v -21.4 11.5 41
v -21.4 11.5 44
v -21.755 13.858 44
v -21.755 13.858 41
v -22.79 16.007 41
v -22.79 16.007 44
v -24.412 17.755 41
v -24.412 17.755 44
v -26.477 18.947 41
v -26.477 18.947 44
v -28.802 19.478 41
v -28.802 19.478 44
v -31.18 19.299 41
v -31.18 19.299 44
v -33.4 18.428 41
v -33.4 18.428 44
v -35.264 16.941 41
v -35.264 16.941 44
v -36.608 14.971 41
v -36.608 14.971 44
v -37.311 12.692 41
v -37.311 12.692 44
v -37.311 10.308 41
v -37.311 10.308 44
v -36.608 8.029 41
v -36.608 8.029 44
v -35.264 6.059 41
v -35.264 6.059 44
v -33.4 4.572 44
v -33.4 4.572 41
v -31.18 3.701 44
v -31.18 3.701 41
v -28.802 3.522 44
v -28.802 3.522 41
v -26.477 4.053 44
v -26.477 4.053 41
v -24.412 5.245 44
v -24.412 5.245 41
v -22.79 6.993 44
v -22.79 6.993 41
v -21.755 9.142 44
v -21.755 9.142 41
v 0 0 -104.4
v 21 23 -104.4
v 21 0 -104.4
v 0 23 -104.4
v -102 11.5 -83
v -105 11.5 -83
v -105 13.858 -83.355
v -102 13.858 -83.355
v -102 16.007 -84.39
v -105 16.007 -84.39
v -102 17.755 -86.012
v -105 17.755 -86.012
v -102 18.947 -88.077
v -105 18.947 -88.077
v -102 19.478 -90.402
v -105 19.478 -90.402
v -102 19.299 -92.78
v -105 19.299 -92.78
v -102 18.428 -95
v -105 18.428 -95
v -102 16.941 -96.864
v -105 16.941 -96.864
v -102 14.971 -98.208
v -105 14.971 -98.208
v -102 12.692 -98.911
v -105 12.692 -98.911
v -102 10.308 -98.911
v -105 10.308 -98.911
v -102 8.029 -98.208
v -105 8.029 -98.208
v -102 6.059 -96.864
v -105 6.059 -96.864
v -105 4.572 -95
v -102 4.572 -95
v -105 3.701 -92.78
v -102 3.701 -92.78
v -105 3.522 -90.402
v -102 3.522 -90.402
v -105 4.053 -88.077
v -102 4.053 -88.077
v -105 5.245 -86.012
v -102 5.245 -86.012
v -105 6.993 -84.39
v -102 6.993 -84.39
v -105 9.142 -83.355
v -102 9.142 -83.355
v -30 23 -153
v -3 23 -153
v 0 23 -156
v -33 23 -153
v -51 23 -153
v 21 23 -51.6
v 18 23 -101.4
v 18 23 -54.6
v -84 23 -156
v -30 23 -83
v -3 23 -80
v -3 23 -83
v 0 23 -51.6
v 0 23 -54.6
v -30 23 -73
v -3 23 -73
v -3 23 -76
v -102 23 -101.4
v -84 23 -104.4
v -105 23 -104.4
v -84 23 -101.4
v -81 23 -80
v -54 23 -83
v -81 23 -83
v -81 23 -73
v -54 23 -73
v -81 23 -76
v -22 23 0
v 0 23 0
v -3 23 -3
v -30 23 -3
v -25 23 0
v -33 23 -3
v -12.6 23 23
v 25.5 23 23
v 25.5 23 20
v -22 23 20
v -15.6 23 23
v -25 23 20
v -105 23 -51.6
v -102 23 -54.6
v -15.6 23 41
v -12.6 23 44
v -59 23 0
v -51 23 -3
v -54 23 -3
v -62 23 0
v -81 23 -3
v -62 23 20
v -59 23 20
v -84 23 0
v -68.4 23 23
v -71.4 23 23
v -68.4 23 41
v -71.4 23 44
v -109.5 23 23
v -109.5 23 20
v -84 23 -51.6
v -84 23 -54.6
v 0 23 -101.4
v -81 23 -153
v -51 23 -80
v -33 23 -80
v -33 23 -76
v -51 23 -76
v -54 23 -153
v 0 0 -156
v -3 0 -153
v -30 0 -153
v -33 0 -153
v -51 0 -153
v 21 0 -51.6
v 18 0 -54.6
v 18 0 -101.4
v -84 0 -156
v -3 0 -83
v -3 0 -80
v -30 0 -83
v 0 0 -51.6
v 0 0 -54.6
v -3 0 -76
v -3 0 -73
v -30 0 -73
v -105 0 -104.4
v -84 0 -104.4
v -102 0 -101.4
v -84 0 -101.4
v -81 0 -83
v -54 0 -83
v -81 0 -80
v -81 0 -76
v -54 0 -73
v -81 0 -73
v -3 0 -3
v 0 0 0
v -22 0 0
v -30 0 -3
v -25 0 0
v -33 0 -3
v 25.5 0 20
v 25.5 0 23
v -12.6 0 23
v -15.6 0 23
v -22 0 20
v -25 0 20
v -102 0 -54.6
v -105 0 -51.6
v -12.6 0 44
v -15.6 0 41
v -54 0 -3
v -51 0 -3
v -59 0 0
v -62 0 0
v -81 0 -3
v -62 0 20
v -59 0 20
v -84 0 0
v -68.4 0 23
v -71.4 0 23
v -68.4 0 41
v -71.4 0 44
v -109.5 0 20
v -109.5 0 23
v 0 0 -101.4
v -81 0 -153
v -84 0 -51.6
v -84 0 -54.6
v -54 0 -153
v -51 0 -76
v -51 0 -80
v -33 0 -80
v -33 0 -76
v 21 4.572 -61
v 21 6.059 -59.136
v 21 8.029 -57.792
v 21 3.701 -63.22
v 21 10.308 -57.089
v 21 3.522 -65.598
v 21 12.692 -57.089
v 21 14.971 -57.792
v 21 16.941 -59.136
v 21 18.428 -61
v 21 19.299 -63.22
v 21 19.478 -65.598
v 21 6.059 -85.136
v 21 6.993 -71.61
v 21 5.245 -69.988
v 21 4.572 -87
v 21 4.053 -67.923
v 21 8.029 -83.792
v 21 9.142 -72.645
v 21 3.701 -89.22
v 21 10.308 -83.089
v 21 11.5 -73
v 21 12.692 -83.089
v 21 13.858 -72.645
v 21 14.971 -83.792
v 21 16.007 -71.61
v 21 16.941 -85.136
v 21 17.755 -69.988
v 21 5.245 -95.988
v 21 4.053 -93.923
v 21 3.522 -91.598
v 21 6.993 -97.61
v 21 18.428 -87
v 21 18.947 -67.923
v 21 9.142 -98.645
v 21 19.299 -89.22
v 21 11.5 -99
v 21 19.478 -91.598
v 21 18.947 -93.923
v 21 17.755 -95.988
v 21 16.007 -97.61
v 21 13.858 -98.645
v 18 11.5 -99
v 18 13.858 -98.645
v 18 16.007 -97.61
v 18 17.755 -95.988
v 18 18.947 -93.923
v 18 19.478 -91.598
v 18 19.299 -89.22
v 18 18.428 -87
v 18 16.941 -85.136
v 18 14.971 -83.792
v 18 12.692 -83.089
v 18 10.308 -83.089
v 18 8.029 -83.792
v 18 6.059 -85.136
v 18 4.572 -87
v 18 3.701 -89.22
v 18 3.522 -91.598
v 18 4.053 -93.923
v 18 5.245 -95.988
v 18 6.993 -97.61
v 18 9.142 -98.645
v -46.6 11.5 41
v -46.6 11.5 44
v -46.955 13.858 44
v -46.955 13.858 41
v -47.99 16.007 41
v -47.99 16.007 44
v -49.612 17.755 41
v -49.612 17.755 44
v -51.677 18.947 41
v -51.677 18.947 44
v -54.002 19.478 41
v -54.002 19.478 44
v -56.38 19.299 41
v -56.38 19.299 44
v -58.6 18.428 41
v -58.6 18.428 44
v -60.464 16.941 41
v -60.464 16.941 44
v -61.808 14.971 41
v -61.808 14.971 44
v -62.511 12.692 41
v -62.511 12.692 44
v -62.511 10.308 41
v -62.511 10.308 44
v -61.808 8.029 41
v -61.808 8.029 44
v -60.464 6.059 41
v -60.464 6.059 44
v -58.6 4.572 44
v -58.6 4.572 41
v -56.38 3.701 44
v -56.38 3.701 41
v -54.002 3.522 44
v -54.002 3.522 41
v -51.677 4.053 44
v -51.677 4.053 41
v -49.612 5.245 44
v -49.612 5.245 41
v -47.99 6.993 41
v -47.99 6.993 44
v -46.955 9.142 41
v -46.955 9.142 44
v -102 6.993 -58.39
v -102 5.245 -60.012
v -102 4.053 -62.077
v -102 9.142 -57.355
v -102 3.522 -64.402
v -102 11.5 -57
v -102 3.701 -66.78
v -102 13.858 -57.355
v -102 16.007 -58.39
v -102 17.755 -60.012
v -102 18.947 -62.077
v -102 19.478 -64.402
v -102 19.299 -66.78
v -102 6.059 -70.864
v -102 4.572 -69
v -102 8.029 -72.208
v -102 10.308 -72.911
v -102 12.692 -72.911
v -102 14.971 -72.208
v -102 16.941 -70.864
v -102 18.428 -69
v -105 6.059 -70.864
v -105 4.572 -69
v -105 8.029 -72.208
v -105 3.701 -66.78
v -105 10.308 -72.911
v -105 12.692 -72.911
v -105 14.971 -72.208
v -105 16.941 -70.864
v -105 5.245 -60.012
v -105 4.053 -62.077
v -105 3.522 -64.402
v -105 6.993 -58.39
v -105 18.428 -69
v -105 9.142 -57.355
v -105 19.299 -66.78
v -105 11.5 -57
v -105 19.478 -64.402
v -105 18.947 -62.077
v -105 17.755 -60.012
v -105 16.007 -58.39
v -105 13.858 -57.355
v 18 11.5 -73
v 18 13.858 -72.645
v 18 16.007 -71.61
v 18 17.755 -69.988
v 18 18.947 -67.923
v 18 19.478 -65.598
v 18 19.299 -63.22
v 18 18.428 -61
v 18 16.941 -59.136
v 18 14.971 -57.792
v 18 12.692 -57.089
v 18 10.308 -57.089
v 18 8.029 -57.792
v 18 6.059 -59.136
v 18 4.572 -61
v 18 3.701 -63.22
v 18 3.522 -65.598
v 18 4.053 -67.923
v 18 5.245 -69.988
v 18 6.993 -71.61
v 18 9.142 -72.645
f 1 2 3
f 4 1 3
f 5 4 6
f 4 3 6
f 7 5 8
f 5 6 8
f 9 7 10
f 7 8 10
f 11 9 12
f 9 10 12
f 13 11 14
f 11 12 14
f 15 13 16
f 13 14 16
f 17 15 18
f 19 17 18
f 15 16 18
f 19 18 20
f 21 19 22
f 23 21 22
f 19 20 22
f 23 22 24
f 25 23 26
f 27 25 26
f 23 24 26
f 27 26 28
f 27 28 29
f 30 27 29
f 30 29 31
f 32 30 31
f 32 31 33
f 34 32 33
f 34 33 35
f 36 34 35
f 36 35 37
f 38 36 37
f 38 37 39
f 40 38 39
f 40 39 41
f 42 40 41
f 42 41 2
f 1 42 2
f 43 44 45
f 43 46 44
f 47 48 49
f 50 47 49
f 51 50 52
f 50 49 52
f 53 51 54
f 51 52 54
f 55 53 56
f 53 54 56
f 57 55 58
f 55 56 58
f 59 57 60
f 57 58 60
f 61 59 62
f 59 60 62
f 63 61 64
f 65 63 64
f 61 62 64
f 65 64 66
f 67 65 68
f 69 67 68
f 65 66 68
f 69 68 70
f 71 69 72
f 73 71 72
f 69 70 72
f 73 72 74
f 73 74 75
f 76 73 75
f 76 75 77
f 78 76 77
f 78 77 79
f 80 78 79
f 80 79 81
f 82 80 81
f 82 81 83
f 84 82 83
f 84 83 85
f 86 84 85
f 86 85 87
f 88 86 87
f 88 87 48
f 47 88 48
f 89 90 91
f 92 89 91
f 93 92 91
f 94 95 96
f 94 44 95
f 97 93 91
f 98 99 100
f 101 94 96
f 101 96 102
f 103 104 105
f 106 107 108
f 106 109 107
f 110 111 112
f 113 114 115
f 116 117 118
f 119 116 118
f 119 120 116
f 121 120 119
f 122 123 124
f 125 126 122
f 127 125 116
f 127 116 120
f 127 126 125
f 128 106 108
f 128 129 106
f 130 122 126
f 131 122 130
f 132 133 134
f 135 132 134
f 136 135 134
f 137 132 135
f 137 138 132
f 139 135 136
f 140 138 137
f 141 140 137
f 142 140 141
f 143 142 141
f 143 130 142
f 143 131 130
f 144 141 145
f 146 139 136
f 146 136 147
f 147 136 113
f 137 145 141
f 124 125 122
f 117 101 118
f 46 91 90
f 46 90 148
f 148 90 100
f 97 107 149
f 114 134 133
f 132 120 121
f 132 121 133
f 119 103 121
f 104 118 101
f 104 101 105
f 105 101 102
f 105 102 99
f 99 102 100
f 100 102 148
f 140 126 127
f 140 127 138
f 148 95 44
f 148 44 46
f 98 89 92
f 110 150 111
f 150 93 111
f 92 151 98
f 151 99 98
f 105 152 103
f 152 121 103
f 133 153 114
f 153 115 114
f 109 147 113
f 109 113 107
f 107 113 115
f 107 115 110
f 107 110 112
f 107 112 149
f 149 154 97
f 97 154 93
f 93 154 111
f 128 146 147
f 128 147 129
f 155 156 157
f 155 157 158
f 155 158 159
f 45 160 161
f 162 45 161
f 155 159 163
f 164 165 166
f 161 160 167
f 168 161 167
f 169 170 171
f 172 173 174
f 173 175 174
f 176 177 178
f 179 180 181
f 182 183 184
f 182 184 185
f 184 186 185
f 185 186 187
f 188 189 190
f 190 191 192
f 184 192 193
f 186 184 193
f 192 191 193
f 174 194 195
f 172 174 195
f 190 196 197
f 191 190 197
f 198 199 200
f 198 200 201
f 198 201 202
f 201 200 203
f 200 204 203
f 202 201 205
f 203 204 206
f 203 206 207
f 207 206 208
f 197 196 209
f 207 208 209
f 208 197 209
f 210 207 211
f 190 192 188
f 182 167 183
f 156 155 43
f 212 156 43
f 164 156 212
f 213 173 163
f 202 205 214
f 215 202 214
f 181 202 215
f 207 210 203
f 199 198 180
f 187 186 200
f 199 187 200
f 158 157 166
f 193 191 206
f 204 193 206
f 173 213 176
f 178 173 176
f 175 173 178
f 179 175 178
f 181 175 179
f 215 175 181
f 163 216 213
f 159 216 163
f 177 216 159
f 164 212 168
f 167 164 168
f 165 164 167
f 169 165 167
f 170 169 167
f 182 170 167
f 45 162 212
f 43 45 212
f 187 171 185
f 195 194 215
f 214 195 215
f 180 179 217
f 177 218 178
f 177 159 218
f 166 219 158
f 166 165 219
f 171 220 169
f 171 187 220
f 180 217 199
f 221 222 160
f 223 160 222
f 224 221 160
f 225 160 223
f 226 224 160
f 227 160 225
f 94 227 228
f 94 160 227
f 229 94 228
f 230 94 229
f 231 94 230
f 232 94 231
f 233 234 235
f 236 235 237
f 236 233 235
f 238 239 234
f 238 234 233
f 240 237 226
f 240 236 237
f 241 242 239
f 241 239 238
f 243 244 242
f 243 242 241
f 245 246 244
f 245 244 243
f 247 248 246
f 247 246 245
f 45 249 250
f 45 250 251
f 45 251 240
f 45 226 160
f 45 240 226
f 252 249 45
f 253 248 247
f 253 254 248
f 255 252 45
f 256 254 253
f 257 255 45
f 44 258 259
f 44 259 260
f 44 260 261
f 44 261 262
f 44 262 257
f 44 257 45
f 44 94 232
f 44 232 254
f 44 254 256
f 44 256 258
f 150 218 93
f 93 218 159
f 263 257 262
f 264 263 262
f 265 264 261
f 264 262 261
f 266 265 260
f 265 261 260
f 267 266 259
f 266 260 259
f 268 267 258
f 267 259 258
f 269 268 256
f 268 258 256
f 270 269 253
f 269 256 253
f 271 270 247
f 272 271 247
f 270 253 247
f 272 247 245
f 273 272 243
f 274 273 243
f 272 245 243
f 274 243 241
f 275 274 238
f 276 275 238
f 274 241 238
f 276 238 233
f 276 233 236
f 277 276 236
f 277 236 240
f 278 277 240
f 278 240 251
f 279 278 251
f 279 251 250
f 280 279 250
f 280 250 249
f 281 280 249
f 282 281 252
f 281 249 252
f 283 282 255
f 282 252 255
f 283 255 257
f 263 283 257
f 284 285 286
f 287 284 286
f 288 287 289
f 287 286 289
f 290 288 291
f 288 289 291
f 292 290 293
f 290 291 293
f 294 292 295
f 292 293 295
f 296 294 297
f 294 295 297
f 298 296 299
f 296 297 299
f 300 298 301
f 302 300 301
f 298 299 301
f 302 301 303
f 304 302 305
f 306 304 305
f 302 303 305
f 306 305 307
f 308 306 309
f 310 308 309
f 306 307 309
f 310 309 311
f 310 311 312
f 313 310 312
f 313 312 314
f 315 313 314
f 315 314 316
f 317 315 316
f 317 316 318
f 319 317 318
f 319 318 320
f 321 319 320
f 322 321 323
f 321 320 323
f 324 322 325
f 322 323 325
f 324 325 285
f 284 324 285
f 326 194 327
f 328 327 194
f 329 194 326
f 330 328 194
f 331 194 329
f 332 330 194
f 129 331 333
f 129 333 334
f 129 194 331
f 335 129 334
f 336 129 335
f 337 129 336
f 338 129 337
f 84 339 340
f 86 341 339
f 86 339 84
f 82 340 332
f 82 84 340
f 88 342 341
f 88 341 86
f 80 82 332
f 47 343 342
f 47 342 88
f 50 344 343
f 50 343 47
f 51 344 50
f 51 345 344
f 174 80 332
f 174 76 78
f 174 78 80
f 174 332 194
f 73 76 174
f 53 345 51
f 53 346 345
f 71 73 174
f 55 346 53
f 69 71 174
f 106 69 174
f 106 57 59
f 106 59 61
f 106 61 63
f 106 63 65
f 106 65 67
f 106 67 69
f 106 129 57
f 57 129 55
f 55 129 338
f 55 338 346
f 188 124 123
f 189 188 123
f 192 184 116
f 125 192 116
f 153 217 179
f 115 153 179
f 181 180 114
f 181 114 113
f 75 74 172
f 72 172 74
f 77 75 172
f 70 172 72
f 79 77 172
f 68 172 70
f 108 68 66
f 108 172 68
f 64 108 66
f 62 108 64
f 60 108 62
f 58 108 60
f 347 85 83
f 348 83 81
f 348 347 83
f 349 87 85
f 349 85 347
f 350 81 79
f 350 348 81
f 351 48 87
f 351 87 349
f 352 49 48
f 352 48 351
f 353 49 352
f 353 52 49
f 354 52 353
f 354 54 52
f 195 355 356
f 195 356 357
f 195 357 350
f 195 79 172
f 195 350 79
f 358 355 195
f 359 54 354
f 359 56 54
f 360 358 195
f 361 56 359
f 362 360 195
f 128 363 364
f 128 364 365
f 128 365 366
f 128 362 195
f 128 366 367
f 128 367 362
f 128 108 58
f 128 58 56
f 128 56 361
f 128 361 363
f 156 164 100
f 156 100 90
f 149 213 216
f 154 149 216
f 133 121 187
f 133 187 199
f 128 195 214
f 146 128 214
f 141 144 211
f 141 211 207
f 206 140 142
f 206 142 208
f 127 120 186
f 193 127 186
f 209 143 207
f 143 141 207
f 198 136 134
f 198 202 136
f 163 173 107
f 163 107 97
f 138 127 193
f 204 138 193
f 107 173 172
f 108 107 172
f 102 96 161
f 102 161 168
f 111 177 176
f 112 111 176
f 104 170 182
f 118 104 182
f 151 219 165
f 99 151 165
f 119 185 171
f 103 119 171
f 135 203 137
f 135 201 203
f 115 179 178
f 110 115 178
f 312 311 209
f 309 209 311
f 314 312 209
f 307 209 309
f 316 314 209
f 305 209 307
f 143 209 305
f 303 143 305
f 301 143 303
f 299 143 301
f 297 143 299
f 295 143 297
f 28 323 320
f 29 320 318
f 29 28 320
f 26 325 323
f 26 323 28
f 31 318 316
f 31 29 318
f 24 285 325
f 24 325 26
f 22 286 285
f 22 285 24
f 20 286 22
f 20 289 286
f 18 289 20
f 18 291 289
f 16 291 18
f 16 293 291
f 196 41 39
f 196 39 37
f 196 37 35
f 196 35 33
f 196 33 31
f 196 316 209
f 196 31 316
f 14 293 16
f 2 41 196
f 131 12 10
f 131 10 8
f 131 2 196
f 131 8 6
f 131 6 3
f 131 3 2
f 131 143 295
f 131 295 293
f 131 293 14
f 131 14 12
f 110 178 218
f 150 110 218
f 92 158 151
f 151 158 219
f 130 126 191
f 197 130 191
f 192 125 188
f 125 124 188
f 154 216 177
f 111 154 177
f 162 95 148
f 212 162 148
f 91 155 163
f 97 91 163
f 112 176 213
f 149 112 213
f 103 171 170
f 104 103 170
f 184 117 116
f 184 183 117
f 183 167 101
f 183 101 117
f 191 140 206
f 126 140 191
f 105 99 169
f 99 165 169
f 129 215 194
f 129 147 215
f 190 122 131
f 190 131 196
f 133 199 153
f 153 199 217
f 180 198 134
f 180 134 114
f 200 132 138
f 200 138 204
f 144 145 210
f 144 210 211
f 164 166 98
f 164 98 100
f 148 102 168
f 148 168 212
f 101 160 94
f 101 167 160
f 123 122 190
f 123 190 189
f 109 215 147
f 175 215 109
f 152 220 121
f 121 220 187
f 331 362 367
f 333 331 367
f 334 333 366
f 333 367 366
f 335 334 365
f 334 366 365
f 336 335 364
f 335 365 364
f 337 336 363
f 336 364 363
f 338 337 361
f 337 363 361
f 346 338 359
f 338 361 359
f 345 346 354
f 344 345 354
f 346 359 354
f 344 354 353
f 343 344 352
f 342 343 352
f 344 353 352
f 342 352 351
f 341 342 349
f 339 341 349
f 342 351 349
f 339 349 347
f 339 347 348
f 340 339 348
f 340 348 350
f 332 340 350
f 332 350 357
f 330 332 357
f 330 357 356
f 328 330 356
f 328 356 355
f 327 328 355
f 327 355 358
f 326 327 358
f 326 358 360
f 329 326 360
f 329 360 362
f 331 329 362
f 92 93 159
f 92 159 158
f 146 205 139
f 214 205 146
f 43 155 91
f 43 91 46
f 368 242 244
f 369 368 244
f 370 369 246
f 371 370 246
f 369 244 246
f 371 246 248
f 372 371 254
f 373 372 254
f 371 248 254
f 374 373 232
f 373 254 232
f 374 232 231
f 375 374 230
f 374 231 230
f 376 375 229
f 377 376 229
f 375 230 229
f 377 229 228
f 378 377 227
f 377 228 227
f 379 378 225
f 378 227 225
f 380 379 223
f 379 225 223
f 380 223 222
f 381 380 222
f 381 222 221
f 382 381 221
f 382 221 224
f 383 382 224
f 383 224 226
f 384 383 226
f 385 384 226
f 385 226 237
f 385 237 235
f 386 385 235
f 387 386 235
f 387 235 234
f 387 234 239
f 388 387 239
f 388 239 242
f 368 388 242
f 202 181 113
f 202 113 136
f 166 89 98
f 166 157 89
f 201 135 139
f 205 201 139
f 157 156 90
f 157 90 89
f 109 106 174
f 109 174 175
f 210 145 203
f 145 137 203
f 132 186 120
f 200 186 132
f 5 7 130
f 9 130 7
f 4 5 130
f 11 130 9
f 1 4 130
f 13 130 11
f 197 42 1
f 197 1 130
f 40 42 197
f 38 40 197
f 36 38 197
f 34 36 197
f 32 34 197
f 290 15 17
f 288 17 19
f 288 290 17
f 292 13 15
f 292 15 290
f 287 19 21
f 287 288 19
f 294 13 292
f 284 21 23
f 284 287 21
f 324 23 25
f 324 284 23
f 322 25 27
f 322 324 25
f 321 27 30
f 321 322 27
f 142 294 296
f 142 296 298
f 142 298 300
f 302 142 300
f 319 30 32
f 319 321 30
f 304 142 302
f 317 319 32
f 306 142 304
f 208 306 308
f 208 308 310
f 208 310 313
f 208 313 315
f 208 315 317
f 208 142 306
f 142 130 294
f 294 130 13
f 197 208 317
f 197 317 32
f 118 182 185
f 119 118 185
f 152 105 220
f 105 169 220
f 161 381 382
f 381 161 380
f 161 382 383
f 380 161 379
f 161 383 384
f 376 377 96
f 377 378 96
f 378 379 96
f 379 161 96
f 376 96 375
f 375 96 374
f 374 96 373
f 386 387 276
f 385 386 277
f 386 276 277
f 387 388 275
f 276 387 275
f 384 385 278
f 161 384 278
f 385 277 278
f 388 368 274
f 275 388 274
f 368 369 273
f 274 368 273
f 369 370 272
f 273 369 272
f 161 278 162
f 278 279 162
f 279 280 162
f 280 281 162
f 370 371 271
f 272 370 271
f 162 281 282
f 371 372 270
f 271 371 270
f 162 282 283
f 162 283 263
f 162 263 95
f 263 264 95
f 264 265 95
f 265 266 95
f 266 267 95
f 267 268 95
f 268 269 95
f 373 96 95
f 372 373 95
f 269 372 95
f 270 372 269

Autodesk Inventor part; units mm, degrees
ref_plane "YZ Plane" through (0, 0, 0) normal (1, 0, 0) x (0, 1, 0)
ref_plane "XZ Plane" through (0, 0, 0) normal (0, 1, 0) x (-1, 0, 0)
ref_plane "XY Plane" through (0, 0, 0) normal (0, 0, 1) x (1, 0, 0)
sketch "Sketch1" plane through (0, 0, 0) normal (0, 1, 0) x (-1, 0, 0)
  line L0 (0, 0) -> (84, 0)
  line L1 (84, 0) -> (84, -156)
  line L2 (0, -156) -> (0, 0)
  line L3 (0, 0) -> (3, 0) construction
  line L4 (3, 0) -> (3, -3) construction
  line L5 (3, -3) -> (0, -3) construction
  line L6 (0, -3) -> (0, 0) construction
  line L7 (84, -153) -> (84, -156) construction
  line L8 (3, -3) -> (30, -3)
  line L9 (30, -3) -> (30, -73)
  line L10 (30, -73) -> (3, -73)
  line L11 (3, -73) -> (3, -3)
  line L12 (78, -153) -> (54, -153)
  line L13 (54, -153) -> (54, -83)
  line L14 (54, -83) -> (81, -83)
  line L15 (81, -83) -> (81, -153)
  line L16 (0, -153) -> (0, -156) construction
  line L17 (84, 0) -> (81, 0) construction
  line L18 (81, 0) -> (81, -3) construction
  line L19 (81, -3) -> (84, -3) construction
  line L20 (84, -3) -> (84, 0) construction
  line L21 (81, -3) -> (54, -3)
  line L22 (54, -3) -> (54, -73)
  line L23 (54, -73) -> (81, -73)
  line L24 (81, -73) -> (81, -3)
  line L25 (6, -153) -> (30, -153)
  line L26 (30, -153) -> (30, -83)
  line L27 (30, -83) -> (3, -83)
  line L28 (3, -83) -> (3, -153)
  line L29 (30, -3) -> (33, -3) construction
  line L30 (54, -153) -> (51, -153) construction
  line L31 (33, -3) -> (51, -3)
  line L32 (51, -153) -> (33, -153)
  line L33 (3, -73) -> (3, -76) construction
  line L34 (81, -83) -> (81, -80) construction
  line L35 (81, -76) -> (81, -80)
  line L36 (3, -80) -> (3, -76)
  line L37 (33, -153) -> (33, -80)
  line L38 (33, -76) -> (33, -3)
  line L39 (3, -76) -> (33, -76)
  line L40 (51, -76) -> (81, -76)
  line L41 (81, -80) -> (51, -80)
  line L42 (33, -80) -> (3, -80)
  line L43 (51, -3) -> (51, -76)
  line L44 (51, -80) -> (51, -153)
  line L45 (6, -153) -> (78, -153)
  line L46 (3, -153) -> (6, -153)
  line L47 (6, -156) -> (3, -156)
  line L48 (81, -153) -> (78, -153)
  line L49 (78, -156) -> (81, -156)
  line L50 (6, -156) -> (78, -156)
  line L51 (81, -156) -> (84, -156)
  line L52 (3, -156) -> (0, -156)
  dimension "d1" = 156
  dimension "d12" = 3
  dimension "d13" = 3
  dimension "d15" = 70
  dimension "d17" = 70
  dimension "d66" = 3
  dimension "d68" = 3
extrude "Extrusion1" add sketch "Sketch1" along normal blind 23
sketch "Sketch5" plane through (0, 0, 0) normal (1, 0, 0) x (0, 0, -1)
  circle A0 centre (16.6, 11.5) radius 3.5 projected
  circle A1 centre (139.4, 11.5) radius 3.5 projected
  line L0 (153, 23) -> (83, 23) projected
  line L1 (156, 0) -> (0, 0) projected
  line L2 (16.6, 11.5) -> (51.6, 11.5)
  line L3 (139.4, 11.5) -> (104.4, 11.5)
  line L4 (51.6, 23) -> (104.4, 23)
  line L5 (104.4, 23) -> (104.4, 0)
  line L6 (104.4, 0) -> (51.6, 0)
  line L7 (51.6, 0) -> (51.6, 23)
  point P0 (162, 0)
  dimension "d97" = 35
  dimension "d98" = 35
extrude "Extrusion6" add sketch "Sketch5" along normal blind 21 contours L7 L4 L0 L5 L1
sketch "Sketch6" plane through (0, 23, 0) normal (0, 1, 0) x (1, 0, 0)
  line L0 (0, 51.6) -> (21, 51.6) projected
  line L1 (21, 51.6) -> (18, 51.6)
  line L2 (18, 51.6) -> (18, 54.6)
  line L3 (18, 54.6) -> (21, 54.6)
  line L4 (21, 54.6) -> (21, 51.6)
  line L5 (0, 104.4) -> (21, 104.4) projected
  line L6 (21, 104.4) -> (18, 104.4)
  line L7 (18, 104.4) -> (18, 101.4)
  line L8 (18, 101.4) -> (21, 101.4)
  line L9 (21, 101.4) -> (21, 104.4)
  line L10 (18, 54.6) -> (0, 54.6)
  line L11 (18, 54.6) -> (18, 101.4)
  line L12 (18, 101.4) -> (0, 101.4)
  line L13 (0, 54.6) -> (0, 101.4)
  line L14 (-84, 156) -> (-84, 0) projected
  line L15 (-84, 54.6) -> (-102, 54.6)
  line L16 (-84, 54.6) -> (-66, 54.6) construction
  line L17 (-102, 54.6) -> (-102, 101.4)
  line L18 (-102, 101.4) -> (-84, 101.4)
  line L19 (-84, 101.4) -> (-84, 104.4)
  line L20 (-84, 104.4) -> (-105, 104.4)
  line L21 (-105, 104.4) -> (-105, 51.6)
  line L22 (-105, 51.6) -> (-84, 51.6)
  line L23 (-84, 51.6) -> (-84, 54.6)
  point P0 (0, 0)
  point P1 (21, 49.6)
  point P2 (21, 106.4)
  dimension "d99" = 3
  dimension "d100" = 3
  dimension "d101" = 3
  dimension "d102" = 3
  dimension "d112" = 18
  dimension "d113" = 180
  dimension "d114" = 3
  dimension "d115" = 21
extrude "Extrusion7" cut sketch "Sketch6" against normal up to surface (23 mm away) contours L10 L13 L12 L11
extrude "Extrusion10" add sketch "Sketch6" against normal up to surface (23 mm away) contours L14 L18 L17 L15 L22 L21 L20
sketch "Sketch7" plane through (21, 0, 0) normal (1, 0, 0) x (0, 0, -1)
  line L0 (51.6, 0) -> (104.4, 0) projected
  circle A0 centre (91, 11.5) radius 8
  circle A1 centre (65, 11.5) radius 8
  line L1 (104.4, 23) -> (104.4, 0) projected
  line L2 (104.4, 23) -> (91, 23)
  line L3 (91, 23) -> (91, 11.5)
  line L4 (91, 11.5) -> (104.4, 11.5)
  line L5 (104.4, 11.5) -> (104.4, 23)
  circle A2 centre (91, 11.5) radius 8
  circle A3 centre (65, 11.5) radius 8
  point P0 (0, 0)
  dimension "d108" = 16
  dimension "d109" = 16
  dimension "d118" = 13.4
  dimension "d119" = 11.5
extrude "Extrusion9" cut sketch "Sketch7" against normal up to surface (3 mm away) contours L4 L3 A0 | A0 L3 L4 | A1
sketch "Sketch9" plane through (-105, 23, -104.4) normal (-1, 0, 0) x (0, 0, 1)
  line L0 (0, 0) -> (0, -23) projected
  line L1 (0, 0) -> (13.4, 0)
  line L2 (13.4, 0) -> (13.4, -11.5)
  line L3 (13.4, -11.5) -> (0, -11.5)
  line L4 (0, -11.5) -> (0, 0)
  circle A0 centre (13.4, -11.5) radius 8
  line L5 (0, 0) -> (52.8, 0) projected
  line L6 (52.8, 0) -> (39.4, 0)
  line L7 (39.4, 0) -> (39.4, -11.5)
  line L8 (39.4, -11.5) -> (52.8, -11.5)
  line L9 (52.8, -11.5) -> (52.8, 0)
  circle A1 centre (39.4, -11.5) radius 8
  point P0 (104.4, -23)
  dimension "d120" = 13.4
  dimension "d121" = 11.5
  dimension "d122" = 16
  dimension "d123" = 13.4
  dimension "d124" = 11.5
  dimension "d125" = 16
extrude "Extrusion11" cut sketch "Sketch9" against normal blind 10 contours A0 L2 L3 | L3 L2 A0 | A1 L8 L7 | L7 L8 A1
sketch "Sketch10" plane through (-84, 0, 0) normal (0, 0, 1) x (1, 0, 0)
  line L0 (25, 23) -> (25, 0)
  line L1 (0, 0) -> (84, 0) projected
  line L2 (25, 0) -> (22, 0)
  line L3 (22, 0) -> (22, 23)
  line L4 (22, 23) -> (25, 23)
  line L5 (59, 23) -> (59, 0)
  line L6 (81, 0) -> (54, 0) projected
  line L7 (59, 0) -> (62, 0)
  line L8 (62, 0) -> (62, 23)
  line L9 (62, 23) -> (59, 23)
  point P0 (0, 23)
  point P1 (84, 23)
  dimension "d128" = 25
  dimension "d129" = 3
  dimension "d130" = 25
  dimension "d131" = 3
extrude "Extrusion12" add sketch "Sketch10" along normal blind 23
sketch "Sketch11" plane through (-62, 0, 0) normal (-1, 0, 0) x (0, 0, 1)
  line L0 (0, 0) -> (23, 0) projected
  line L1 (23, 23) -> (20, 23)
  line L2 (20, 23) -> (20, 0)
  line L3 (20, 0) -> (23, 0)
  line L4 (23, 0) -> (23, 23)
  dimension "d134" = 3
extrude "Extrusion13" add sketch "Sketch11" along normal blind 47.5 and the other way blind 87.5
sketch "Sketch12" plane through (-84, 0, 23) normal (0, 0, 1) x (1, 0, 0)
  line L0 (109.5, 23) -> (62, 23) projected
  line L1 (109.5, 23) -> (71.4, 23)
  line L2 (71.4, 23) -> (71.4, 0)
  line L3 (-25.5, 0) -> (109.5, 0) projected
  line L4 (109.5, 0) -> (62, 0) projected
  line L5 (71.4, 23) -> (68.4, 23)
  line L6 (68.4, 23) -> (68.4, 0)
  line L7 (68.4, 0) -> (71.4, 0)
  line L8 (71.4, 0) -> (71.4, 23)
  line L9 (12.6, 23) -> (12.6, 0)
  line L10 (22, 0) -> (-25.5, 0) projected
  line L11 (12.6, 23) -> (15.6, 23)
  line L12 (15.6, 23) -> (15.6, 0)
  line L13 (15.6, 0) -> (12.6, 0)
  line L14 (12.6, 0) -> (12.6, 23)
  point P0 (84, 0)
  point P1 (-25.5, 23)
  point P2 (15.6, 0)
  dimension "d139" = 38.1
  dimension "d140" = 3
  dimension "d141" = 38.1
  dimension "d142" = 3
extrude "Extrusion14" add sketch "Sketch12" along normal blind 21
sketch "Sketch13" plane through (-71.4, 0, 23) normal (-1, 0, 0) x (0, 0, 1)
  line L0 (0, 23) -> (21, 23) projected
  line L1 (0, 0) -> (21, 0) projected
  line L2 (21, 23) -> (18, 23)
  line L3 (18, 23) -> (18, 0)
  line L4 (18, 0) -> (21, 0)
  line L5 (21, 0) -> (21, 23)
  point P0 (-23, 0)
  point P1 (18, 23)
  dimension "d145" = 3
extrude "Extrusion15" add sketch "Sketch13" against normal up to surface (58.8 mm away)
sketch "Sketch14" plane through (-84, 0, 44) normal (0, 0, 1) x (1, 0, 0)
  line L0 (71.4, 23) -> (54.6, 23)
  line L1 (54.6, 23) -> (54.6, 11.5)
  line L2 (54.6, 11.5) -> (71.4, 11.5)
  line L3 (71.4, 11.5) -> (71.4, 23)
  circle A0 centre (54.6, 11.5) radius 8
  line L4 (71.4, 23) -> (12.6, 23) projected
  line L5 (12.6, 23) -> (29.4, 23)
  line L6 (29.4, 23) -> (29.4, 11.5)
  line L7 (29.4, 11.5) -> (12.6, 11.5)
  line L8 (12.6, 11.5) -> (12.6, 23)
  circle A1 centre (29.4, 11.5) radius 8
  point P0 (84, 0)
  dimension "d148" = 16.8
  dimension "d149" = 11.5
  dimension "d150" = 16
  dimension "d151" = 16.8
  dimension "d152" = 11.5
  dimension "d153" = 16
extrude "Extrusion16" cut sketch "Sketch14" against normal blind 10 contours A0 L2 L1 | L1 L2 A0 | A1 L7 L6 | L6 L7 A1
properties part number "Motorcompartiment"
